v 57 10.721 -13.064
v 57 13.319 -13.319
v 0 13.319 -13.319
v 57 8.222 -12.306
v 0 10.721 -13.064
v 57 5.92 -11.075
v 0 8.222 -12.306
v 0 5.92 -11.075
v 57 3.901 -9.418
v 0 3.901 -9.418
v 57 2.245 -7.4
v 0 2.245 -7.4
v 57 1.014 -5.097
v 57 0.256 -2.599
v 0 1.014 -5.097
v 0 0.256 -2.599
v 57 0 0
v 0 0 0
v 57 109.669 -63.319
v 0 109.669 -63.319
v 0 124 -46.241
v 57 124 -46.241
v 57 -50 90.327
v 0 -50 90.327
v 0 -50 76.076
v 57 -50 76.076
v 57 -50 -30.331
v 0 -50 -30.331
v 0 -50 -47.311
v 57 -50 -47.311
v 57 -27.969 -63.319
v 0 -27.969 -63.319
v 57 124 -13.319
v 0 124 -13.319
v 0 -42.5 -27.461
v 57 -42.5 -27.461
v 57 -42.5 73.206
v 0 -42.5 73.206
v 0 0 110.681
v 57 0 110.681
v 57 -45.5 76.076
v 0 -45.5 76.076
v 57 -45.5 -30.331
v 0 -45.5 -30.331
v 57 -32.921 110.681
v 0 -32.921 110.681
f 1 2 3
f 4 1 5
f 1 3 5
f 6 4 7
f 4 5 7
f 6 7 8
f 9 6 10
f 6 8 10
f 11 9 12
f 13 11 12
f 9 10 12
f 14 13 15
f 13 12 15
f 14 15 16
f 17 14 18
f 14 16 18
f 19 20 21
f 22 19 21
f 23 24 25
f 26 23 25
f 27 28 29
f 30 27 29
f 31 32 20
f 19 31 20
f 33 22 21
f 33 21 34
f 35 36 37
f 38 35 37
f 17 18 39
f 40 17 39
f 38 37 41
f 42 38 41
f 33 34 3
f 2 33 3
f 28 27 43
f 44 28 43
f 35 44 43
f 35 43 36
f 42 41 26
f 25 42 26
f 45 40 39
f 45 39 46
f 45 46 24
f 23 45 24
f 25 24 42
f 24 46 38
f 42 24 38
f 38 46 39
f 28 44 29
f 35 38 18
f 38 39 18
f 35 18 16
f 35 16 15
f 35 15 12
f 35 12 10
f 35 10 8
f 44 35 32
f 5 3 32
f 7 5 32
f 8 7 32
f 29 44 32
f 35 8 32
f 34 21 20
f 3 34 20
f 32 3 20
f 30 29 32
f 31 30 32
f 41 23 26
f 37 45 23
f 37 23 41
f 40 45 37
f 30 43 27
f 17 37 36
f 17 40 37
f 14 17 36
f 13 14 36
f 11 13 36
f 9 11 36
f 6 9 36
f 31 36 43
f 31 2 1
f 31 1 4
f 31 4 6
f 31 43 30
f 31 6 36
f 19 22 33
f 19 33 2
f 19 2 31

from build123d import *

# Parameters (mm, degrees)
BOSS_EXTRUDE1_DEPTH = 57
CUT_EXTRUDE1_DEPTH  = 58


with BuildPart() as part:
    # Sketch2 → Boss-Extrude1 (new body)
    with BuildSketch(Plane(origin=(0, 0, 0), x_dir=(0, 0, -1), z_dir=(1, 0, 0))):
        with BuildLine():
            Line((-110.680525015, 0), (-110.680525015, -32.921204516))
            Line((-110.680525015, -32.921204516), (-90.326809139, -50))
            Line((-90.326809139, -50), (47.311208732, -50))
            Line((47.311208732, -50), (63.319474985, -27.968828863))
            Line((63.319474985, -27.968828863), (63.319474985, 109.669189008))
            Line((63.319474985, 109.669189008), (46.240679501, 124))
            Line((46.240679501, 124), (13.319474985, 124))
            Line((13.319474985, 124), (13.319474985, 13.319474985))
            ThreePointArc((13.319474985, 13.319474985), (9.418291084, 3.901183901), (0, 0))
            Line((0, 0), (-110.680525015, 0))
        make_face()
    extrude(amount=BOSS_EXTRUDE1_DEPTH)

    # Sketch3 → Cut-Extrude1 (cut, through all)
    with BuildSketch(Plane(origin=(57, 0, 0), x_dir=(0, 0, -1), z_dir=(1, 0, 0))):
        Polygon((-76.075907073, -45.5), (-76.075907073, -50), (30.330747693, -50), (30.330747693, -45.5), (27.461329109, -42.5), (-73.206488489, -42.5), align=None)
    extrude(amount=-CUT_EXTRUDE1_DEPTH, mode=Mode.SUBTRACT)


solid = part.part
